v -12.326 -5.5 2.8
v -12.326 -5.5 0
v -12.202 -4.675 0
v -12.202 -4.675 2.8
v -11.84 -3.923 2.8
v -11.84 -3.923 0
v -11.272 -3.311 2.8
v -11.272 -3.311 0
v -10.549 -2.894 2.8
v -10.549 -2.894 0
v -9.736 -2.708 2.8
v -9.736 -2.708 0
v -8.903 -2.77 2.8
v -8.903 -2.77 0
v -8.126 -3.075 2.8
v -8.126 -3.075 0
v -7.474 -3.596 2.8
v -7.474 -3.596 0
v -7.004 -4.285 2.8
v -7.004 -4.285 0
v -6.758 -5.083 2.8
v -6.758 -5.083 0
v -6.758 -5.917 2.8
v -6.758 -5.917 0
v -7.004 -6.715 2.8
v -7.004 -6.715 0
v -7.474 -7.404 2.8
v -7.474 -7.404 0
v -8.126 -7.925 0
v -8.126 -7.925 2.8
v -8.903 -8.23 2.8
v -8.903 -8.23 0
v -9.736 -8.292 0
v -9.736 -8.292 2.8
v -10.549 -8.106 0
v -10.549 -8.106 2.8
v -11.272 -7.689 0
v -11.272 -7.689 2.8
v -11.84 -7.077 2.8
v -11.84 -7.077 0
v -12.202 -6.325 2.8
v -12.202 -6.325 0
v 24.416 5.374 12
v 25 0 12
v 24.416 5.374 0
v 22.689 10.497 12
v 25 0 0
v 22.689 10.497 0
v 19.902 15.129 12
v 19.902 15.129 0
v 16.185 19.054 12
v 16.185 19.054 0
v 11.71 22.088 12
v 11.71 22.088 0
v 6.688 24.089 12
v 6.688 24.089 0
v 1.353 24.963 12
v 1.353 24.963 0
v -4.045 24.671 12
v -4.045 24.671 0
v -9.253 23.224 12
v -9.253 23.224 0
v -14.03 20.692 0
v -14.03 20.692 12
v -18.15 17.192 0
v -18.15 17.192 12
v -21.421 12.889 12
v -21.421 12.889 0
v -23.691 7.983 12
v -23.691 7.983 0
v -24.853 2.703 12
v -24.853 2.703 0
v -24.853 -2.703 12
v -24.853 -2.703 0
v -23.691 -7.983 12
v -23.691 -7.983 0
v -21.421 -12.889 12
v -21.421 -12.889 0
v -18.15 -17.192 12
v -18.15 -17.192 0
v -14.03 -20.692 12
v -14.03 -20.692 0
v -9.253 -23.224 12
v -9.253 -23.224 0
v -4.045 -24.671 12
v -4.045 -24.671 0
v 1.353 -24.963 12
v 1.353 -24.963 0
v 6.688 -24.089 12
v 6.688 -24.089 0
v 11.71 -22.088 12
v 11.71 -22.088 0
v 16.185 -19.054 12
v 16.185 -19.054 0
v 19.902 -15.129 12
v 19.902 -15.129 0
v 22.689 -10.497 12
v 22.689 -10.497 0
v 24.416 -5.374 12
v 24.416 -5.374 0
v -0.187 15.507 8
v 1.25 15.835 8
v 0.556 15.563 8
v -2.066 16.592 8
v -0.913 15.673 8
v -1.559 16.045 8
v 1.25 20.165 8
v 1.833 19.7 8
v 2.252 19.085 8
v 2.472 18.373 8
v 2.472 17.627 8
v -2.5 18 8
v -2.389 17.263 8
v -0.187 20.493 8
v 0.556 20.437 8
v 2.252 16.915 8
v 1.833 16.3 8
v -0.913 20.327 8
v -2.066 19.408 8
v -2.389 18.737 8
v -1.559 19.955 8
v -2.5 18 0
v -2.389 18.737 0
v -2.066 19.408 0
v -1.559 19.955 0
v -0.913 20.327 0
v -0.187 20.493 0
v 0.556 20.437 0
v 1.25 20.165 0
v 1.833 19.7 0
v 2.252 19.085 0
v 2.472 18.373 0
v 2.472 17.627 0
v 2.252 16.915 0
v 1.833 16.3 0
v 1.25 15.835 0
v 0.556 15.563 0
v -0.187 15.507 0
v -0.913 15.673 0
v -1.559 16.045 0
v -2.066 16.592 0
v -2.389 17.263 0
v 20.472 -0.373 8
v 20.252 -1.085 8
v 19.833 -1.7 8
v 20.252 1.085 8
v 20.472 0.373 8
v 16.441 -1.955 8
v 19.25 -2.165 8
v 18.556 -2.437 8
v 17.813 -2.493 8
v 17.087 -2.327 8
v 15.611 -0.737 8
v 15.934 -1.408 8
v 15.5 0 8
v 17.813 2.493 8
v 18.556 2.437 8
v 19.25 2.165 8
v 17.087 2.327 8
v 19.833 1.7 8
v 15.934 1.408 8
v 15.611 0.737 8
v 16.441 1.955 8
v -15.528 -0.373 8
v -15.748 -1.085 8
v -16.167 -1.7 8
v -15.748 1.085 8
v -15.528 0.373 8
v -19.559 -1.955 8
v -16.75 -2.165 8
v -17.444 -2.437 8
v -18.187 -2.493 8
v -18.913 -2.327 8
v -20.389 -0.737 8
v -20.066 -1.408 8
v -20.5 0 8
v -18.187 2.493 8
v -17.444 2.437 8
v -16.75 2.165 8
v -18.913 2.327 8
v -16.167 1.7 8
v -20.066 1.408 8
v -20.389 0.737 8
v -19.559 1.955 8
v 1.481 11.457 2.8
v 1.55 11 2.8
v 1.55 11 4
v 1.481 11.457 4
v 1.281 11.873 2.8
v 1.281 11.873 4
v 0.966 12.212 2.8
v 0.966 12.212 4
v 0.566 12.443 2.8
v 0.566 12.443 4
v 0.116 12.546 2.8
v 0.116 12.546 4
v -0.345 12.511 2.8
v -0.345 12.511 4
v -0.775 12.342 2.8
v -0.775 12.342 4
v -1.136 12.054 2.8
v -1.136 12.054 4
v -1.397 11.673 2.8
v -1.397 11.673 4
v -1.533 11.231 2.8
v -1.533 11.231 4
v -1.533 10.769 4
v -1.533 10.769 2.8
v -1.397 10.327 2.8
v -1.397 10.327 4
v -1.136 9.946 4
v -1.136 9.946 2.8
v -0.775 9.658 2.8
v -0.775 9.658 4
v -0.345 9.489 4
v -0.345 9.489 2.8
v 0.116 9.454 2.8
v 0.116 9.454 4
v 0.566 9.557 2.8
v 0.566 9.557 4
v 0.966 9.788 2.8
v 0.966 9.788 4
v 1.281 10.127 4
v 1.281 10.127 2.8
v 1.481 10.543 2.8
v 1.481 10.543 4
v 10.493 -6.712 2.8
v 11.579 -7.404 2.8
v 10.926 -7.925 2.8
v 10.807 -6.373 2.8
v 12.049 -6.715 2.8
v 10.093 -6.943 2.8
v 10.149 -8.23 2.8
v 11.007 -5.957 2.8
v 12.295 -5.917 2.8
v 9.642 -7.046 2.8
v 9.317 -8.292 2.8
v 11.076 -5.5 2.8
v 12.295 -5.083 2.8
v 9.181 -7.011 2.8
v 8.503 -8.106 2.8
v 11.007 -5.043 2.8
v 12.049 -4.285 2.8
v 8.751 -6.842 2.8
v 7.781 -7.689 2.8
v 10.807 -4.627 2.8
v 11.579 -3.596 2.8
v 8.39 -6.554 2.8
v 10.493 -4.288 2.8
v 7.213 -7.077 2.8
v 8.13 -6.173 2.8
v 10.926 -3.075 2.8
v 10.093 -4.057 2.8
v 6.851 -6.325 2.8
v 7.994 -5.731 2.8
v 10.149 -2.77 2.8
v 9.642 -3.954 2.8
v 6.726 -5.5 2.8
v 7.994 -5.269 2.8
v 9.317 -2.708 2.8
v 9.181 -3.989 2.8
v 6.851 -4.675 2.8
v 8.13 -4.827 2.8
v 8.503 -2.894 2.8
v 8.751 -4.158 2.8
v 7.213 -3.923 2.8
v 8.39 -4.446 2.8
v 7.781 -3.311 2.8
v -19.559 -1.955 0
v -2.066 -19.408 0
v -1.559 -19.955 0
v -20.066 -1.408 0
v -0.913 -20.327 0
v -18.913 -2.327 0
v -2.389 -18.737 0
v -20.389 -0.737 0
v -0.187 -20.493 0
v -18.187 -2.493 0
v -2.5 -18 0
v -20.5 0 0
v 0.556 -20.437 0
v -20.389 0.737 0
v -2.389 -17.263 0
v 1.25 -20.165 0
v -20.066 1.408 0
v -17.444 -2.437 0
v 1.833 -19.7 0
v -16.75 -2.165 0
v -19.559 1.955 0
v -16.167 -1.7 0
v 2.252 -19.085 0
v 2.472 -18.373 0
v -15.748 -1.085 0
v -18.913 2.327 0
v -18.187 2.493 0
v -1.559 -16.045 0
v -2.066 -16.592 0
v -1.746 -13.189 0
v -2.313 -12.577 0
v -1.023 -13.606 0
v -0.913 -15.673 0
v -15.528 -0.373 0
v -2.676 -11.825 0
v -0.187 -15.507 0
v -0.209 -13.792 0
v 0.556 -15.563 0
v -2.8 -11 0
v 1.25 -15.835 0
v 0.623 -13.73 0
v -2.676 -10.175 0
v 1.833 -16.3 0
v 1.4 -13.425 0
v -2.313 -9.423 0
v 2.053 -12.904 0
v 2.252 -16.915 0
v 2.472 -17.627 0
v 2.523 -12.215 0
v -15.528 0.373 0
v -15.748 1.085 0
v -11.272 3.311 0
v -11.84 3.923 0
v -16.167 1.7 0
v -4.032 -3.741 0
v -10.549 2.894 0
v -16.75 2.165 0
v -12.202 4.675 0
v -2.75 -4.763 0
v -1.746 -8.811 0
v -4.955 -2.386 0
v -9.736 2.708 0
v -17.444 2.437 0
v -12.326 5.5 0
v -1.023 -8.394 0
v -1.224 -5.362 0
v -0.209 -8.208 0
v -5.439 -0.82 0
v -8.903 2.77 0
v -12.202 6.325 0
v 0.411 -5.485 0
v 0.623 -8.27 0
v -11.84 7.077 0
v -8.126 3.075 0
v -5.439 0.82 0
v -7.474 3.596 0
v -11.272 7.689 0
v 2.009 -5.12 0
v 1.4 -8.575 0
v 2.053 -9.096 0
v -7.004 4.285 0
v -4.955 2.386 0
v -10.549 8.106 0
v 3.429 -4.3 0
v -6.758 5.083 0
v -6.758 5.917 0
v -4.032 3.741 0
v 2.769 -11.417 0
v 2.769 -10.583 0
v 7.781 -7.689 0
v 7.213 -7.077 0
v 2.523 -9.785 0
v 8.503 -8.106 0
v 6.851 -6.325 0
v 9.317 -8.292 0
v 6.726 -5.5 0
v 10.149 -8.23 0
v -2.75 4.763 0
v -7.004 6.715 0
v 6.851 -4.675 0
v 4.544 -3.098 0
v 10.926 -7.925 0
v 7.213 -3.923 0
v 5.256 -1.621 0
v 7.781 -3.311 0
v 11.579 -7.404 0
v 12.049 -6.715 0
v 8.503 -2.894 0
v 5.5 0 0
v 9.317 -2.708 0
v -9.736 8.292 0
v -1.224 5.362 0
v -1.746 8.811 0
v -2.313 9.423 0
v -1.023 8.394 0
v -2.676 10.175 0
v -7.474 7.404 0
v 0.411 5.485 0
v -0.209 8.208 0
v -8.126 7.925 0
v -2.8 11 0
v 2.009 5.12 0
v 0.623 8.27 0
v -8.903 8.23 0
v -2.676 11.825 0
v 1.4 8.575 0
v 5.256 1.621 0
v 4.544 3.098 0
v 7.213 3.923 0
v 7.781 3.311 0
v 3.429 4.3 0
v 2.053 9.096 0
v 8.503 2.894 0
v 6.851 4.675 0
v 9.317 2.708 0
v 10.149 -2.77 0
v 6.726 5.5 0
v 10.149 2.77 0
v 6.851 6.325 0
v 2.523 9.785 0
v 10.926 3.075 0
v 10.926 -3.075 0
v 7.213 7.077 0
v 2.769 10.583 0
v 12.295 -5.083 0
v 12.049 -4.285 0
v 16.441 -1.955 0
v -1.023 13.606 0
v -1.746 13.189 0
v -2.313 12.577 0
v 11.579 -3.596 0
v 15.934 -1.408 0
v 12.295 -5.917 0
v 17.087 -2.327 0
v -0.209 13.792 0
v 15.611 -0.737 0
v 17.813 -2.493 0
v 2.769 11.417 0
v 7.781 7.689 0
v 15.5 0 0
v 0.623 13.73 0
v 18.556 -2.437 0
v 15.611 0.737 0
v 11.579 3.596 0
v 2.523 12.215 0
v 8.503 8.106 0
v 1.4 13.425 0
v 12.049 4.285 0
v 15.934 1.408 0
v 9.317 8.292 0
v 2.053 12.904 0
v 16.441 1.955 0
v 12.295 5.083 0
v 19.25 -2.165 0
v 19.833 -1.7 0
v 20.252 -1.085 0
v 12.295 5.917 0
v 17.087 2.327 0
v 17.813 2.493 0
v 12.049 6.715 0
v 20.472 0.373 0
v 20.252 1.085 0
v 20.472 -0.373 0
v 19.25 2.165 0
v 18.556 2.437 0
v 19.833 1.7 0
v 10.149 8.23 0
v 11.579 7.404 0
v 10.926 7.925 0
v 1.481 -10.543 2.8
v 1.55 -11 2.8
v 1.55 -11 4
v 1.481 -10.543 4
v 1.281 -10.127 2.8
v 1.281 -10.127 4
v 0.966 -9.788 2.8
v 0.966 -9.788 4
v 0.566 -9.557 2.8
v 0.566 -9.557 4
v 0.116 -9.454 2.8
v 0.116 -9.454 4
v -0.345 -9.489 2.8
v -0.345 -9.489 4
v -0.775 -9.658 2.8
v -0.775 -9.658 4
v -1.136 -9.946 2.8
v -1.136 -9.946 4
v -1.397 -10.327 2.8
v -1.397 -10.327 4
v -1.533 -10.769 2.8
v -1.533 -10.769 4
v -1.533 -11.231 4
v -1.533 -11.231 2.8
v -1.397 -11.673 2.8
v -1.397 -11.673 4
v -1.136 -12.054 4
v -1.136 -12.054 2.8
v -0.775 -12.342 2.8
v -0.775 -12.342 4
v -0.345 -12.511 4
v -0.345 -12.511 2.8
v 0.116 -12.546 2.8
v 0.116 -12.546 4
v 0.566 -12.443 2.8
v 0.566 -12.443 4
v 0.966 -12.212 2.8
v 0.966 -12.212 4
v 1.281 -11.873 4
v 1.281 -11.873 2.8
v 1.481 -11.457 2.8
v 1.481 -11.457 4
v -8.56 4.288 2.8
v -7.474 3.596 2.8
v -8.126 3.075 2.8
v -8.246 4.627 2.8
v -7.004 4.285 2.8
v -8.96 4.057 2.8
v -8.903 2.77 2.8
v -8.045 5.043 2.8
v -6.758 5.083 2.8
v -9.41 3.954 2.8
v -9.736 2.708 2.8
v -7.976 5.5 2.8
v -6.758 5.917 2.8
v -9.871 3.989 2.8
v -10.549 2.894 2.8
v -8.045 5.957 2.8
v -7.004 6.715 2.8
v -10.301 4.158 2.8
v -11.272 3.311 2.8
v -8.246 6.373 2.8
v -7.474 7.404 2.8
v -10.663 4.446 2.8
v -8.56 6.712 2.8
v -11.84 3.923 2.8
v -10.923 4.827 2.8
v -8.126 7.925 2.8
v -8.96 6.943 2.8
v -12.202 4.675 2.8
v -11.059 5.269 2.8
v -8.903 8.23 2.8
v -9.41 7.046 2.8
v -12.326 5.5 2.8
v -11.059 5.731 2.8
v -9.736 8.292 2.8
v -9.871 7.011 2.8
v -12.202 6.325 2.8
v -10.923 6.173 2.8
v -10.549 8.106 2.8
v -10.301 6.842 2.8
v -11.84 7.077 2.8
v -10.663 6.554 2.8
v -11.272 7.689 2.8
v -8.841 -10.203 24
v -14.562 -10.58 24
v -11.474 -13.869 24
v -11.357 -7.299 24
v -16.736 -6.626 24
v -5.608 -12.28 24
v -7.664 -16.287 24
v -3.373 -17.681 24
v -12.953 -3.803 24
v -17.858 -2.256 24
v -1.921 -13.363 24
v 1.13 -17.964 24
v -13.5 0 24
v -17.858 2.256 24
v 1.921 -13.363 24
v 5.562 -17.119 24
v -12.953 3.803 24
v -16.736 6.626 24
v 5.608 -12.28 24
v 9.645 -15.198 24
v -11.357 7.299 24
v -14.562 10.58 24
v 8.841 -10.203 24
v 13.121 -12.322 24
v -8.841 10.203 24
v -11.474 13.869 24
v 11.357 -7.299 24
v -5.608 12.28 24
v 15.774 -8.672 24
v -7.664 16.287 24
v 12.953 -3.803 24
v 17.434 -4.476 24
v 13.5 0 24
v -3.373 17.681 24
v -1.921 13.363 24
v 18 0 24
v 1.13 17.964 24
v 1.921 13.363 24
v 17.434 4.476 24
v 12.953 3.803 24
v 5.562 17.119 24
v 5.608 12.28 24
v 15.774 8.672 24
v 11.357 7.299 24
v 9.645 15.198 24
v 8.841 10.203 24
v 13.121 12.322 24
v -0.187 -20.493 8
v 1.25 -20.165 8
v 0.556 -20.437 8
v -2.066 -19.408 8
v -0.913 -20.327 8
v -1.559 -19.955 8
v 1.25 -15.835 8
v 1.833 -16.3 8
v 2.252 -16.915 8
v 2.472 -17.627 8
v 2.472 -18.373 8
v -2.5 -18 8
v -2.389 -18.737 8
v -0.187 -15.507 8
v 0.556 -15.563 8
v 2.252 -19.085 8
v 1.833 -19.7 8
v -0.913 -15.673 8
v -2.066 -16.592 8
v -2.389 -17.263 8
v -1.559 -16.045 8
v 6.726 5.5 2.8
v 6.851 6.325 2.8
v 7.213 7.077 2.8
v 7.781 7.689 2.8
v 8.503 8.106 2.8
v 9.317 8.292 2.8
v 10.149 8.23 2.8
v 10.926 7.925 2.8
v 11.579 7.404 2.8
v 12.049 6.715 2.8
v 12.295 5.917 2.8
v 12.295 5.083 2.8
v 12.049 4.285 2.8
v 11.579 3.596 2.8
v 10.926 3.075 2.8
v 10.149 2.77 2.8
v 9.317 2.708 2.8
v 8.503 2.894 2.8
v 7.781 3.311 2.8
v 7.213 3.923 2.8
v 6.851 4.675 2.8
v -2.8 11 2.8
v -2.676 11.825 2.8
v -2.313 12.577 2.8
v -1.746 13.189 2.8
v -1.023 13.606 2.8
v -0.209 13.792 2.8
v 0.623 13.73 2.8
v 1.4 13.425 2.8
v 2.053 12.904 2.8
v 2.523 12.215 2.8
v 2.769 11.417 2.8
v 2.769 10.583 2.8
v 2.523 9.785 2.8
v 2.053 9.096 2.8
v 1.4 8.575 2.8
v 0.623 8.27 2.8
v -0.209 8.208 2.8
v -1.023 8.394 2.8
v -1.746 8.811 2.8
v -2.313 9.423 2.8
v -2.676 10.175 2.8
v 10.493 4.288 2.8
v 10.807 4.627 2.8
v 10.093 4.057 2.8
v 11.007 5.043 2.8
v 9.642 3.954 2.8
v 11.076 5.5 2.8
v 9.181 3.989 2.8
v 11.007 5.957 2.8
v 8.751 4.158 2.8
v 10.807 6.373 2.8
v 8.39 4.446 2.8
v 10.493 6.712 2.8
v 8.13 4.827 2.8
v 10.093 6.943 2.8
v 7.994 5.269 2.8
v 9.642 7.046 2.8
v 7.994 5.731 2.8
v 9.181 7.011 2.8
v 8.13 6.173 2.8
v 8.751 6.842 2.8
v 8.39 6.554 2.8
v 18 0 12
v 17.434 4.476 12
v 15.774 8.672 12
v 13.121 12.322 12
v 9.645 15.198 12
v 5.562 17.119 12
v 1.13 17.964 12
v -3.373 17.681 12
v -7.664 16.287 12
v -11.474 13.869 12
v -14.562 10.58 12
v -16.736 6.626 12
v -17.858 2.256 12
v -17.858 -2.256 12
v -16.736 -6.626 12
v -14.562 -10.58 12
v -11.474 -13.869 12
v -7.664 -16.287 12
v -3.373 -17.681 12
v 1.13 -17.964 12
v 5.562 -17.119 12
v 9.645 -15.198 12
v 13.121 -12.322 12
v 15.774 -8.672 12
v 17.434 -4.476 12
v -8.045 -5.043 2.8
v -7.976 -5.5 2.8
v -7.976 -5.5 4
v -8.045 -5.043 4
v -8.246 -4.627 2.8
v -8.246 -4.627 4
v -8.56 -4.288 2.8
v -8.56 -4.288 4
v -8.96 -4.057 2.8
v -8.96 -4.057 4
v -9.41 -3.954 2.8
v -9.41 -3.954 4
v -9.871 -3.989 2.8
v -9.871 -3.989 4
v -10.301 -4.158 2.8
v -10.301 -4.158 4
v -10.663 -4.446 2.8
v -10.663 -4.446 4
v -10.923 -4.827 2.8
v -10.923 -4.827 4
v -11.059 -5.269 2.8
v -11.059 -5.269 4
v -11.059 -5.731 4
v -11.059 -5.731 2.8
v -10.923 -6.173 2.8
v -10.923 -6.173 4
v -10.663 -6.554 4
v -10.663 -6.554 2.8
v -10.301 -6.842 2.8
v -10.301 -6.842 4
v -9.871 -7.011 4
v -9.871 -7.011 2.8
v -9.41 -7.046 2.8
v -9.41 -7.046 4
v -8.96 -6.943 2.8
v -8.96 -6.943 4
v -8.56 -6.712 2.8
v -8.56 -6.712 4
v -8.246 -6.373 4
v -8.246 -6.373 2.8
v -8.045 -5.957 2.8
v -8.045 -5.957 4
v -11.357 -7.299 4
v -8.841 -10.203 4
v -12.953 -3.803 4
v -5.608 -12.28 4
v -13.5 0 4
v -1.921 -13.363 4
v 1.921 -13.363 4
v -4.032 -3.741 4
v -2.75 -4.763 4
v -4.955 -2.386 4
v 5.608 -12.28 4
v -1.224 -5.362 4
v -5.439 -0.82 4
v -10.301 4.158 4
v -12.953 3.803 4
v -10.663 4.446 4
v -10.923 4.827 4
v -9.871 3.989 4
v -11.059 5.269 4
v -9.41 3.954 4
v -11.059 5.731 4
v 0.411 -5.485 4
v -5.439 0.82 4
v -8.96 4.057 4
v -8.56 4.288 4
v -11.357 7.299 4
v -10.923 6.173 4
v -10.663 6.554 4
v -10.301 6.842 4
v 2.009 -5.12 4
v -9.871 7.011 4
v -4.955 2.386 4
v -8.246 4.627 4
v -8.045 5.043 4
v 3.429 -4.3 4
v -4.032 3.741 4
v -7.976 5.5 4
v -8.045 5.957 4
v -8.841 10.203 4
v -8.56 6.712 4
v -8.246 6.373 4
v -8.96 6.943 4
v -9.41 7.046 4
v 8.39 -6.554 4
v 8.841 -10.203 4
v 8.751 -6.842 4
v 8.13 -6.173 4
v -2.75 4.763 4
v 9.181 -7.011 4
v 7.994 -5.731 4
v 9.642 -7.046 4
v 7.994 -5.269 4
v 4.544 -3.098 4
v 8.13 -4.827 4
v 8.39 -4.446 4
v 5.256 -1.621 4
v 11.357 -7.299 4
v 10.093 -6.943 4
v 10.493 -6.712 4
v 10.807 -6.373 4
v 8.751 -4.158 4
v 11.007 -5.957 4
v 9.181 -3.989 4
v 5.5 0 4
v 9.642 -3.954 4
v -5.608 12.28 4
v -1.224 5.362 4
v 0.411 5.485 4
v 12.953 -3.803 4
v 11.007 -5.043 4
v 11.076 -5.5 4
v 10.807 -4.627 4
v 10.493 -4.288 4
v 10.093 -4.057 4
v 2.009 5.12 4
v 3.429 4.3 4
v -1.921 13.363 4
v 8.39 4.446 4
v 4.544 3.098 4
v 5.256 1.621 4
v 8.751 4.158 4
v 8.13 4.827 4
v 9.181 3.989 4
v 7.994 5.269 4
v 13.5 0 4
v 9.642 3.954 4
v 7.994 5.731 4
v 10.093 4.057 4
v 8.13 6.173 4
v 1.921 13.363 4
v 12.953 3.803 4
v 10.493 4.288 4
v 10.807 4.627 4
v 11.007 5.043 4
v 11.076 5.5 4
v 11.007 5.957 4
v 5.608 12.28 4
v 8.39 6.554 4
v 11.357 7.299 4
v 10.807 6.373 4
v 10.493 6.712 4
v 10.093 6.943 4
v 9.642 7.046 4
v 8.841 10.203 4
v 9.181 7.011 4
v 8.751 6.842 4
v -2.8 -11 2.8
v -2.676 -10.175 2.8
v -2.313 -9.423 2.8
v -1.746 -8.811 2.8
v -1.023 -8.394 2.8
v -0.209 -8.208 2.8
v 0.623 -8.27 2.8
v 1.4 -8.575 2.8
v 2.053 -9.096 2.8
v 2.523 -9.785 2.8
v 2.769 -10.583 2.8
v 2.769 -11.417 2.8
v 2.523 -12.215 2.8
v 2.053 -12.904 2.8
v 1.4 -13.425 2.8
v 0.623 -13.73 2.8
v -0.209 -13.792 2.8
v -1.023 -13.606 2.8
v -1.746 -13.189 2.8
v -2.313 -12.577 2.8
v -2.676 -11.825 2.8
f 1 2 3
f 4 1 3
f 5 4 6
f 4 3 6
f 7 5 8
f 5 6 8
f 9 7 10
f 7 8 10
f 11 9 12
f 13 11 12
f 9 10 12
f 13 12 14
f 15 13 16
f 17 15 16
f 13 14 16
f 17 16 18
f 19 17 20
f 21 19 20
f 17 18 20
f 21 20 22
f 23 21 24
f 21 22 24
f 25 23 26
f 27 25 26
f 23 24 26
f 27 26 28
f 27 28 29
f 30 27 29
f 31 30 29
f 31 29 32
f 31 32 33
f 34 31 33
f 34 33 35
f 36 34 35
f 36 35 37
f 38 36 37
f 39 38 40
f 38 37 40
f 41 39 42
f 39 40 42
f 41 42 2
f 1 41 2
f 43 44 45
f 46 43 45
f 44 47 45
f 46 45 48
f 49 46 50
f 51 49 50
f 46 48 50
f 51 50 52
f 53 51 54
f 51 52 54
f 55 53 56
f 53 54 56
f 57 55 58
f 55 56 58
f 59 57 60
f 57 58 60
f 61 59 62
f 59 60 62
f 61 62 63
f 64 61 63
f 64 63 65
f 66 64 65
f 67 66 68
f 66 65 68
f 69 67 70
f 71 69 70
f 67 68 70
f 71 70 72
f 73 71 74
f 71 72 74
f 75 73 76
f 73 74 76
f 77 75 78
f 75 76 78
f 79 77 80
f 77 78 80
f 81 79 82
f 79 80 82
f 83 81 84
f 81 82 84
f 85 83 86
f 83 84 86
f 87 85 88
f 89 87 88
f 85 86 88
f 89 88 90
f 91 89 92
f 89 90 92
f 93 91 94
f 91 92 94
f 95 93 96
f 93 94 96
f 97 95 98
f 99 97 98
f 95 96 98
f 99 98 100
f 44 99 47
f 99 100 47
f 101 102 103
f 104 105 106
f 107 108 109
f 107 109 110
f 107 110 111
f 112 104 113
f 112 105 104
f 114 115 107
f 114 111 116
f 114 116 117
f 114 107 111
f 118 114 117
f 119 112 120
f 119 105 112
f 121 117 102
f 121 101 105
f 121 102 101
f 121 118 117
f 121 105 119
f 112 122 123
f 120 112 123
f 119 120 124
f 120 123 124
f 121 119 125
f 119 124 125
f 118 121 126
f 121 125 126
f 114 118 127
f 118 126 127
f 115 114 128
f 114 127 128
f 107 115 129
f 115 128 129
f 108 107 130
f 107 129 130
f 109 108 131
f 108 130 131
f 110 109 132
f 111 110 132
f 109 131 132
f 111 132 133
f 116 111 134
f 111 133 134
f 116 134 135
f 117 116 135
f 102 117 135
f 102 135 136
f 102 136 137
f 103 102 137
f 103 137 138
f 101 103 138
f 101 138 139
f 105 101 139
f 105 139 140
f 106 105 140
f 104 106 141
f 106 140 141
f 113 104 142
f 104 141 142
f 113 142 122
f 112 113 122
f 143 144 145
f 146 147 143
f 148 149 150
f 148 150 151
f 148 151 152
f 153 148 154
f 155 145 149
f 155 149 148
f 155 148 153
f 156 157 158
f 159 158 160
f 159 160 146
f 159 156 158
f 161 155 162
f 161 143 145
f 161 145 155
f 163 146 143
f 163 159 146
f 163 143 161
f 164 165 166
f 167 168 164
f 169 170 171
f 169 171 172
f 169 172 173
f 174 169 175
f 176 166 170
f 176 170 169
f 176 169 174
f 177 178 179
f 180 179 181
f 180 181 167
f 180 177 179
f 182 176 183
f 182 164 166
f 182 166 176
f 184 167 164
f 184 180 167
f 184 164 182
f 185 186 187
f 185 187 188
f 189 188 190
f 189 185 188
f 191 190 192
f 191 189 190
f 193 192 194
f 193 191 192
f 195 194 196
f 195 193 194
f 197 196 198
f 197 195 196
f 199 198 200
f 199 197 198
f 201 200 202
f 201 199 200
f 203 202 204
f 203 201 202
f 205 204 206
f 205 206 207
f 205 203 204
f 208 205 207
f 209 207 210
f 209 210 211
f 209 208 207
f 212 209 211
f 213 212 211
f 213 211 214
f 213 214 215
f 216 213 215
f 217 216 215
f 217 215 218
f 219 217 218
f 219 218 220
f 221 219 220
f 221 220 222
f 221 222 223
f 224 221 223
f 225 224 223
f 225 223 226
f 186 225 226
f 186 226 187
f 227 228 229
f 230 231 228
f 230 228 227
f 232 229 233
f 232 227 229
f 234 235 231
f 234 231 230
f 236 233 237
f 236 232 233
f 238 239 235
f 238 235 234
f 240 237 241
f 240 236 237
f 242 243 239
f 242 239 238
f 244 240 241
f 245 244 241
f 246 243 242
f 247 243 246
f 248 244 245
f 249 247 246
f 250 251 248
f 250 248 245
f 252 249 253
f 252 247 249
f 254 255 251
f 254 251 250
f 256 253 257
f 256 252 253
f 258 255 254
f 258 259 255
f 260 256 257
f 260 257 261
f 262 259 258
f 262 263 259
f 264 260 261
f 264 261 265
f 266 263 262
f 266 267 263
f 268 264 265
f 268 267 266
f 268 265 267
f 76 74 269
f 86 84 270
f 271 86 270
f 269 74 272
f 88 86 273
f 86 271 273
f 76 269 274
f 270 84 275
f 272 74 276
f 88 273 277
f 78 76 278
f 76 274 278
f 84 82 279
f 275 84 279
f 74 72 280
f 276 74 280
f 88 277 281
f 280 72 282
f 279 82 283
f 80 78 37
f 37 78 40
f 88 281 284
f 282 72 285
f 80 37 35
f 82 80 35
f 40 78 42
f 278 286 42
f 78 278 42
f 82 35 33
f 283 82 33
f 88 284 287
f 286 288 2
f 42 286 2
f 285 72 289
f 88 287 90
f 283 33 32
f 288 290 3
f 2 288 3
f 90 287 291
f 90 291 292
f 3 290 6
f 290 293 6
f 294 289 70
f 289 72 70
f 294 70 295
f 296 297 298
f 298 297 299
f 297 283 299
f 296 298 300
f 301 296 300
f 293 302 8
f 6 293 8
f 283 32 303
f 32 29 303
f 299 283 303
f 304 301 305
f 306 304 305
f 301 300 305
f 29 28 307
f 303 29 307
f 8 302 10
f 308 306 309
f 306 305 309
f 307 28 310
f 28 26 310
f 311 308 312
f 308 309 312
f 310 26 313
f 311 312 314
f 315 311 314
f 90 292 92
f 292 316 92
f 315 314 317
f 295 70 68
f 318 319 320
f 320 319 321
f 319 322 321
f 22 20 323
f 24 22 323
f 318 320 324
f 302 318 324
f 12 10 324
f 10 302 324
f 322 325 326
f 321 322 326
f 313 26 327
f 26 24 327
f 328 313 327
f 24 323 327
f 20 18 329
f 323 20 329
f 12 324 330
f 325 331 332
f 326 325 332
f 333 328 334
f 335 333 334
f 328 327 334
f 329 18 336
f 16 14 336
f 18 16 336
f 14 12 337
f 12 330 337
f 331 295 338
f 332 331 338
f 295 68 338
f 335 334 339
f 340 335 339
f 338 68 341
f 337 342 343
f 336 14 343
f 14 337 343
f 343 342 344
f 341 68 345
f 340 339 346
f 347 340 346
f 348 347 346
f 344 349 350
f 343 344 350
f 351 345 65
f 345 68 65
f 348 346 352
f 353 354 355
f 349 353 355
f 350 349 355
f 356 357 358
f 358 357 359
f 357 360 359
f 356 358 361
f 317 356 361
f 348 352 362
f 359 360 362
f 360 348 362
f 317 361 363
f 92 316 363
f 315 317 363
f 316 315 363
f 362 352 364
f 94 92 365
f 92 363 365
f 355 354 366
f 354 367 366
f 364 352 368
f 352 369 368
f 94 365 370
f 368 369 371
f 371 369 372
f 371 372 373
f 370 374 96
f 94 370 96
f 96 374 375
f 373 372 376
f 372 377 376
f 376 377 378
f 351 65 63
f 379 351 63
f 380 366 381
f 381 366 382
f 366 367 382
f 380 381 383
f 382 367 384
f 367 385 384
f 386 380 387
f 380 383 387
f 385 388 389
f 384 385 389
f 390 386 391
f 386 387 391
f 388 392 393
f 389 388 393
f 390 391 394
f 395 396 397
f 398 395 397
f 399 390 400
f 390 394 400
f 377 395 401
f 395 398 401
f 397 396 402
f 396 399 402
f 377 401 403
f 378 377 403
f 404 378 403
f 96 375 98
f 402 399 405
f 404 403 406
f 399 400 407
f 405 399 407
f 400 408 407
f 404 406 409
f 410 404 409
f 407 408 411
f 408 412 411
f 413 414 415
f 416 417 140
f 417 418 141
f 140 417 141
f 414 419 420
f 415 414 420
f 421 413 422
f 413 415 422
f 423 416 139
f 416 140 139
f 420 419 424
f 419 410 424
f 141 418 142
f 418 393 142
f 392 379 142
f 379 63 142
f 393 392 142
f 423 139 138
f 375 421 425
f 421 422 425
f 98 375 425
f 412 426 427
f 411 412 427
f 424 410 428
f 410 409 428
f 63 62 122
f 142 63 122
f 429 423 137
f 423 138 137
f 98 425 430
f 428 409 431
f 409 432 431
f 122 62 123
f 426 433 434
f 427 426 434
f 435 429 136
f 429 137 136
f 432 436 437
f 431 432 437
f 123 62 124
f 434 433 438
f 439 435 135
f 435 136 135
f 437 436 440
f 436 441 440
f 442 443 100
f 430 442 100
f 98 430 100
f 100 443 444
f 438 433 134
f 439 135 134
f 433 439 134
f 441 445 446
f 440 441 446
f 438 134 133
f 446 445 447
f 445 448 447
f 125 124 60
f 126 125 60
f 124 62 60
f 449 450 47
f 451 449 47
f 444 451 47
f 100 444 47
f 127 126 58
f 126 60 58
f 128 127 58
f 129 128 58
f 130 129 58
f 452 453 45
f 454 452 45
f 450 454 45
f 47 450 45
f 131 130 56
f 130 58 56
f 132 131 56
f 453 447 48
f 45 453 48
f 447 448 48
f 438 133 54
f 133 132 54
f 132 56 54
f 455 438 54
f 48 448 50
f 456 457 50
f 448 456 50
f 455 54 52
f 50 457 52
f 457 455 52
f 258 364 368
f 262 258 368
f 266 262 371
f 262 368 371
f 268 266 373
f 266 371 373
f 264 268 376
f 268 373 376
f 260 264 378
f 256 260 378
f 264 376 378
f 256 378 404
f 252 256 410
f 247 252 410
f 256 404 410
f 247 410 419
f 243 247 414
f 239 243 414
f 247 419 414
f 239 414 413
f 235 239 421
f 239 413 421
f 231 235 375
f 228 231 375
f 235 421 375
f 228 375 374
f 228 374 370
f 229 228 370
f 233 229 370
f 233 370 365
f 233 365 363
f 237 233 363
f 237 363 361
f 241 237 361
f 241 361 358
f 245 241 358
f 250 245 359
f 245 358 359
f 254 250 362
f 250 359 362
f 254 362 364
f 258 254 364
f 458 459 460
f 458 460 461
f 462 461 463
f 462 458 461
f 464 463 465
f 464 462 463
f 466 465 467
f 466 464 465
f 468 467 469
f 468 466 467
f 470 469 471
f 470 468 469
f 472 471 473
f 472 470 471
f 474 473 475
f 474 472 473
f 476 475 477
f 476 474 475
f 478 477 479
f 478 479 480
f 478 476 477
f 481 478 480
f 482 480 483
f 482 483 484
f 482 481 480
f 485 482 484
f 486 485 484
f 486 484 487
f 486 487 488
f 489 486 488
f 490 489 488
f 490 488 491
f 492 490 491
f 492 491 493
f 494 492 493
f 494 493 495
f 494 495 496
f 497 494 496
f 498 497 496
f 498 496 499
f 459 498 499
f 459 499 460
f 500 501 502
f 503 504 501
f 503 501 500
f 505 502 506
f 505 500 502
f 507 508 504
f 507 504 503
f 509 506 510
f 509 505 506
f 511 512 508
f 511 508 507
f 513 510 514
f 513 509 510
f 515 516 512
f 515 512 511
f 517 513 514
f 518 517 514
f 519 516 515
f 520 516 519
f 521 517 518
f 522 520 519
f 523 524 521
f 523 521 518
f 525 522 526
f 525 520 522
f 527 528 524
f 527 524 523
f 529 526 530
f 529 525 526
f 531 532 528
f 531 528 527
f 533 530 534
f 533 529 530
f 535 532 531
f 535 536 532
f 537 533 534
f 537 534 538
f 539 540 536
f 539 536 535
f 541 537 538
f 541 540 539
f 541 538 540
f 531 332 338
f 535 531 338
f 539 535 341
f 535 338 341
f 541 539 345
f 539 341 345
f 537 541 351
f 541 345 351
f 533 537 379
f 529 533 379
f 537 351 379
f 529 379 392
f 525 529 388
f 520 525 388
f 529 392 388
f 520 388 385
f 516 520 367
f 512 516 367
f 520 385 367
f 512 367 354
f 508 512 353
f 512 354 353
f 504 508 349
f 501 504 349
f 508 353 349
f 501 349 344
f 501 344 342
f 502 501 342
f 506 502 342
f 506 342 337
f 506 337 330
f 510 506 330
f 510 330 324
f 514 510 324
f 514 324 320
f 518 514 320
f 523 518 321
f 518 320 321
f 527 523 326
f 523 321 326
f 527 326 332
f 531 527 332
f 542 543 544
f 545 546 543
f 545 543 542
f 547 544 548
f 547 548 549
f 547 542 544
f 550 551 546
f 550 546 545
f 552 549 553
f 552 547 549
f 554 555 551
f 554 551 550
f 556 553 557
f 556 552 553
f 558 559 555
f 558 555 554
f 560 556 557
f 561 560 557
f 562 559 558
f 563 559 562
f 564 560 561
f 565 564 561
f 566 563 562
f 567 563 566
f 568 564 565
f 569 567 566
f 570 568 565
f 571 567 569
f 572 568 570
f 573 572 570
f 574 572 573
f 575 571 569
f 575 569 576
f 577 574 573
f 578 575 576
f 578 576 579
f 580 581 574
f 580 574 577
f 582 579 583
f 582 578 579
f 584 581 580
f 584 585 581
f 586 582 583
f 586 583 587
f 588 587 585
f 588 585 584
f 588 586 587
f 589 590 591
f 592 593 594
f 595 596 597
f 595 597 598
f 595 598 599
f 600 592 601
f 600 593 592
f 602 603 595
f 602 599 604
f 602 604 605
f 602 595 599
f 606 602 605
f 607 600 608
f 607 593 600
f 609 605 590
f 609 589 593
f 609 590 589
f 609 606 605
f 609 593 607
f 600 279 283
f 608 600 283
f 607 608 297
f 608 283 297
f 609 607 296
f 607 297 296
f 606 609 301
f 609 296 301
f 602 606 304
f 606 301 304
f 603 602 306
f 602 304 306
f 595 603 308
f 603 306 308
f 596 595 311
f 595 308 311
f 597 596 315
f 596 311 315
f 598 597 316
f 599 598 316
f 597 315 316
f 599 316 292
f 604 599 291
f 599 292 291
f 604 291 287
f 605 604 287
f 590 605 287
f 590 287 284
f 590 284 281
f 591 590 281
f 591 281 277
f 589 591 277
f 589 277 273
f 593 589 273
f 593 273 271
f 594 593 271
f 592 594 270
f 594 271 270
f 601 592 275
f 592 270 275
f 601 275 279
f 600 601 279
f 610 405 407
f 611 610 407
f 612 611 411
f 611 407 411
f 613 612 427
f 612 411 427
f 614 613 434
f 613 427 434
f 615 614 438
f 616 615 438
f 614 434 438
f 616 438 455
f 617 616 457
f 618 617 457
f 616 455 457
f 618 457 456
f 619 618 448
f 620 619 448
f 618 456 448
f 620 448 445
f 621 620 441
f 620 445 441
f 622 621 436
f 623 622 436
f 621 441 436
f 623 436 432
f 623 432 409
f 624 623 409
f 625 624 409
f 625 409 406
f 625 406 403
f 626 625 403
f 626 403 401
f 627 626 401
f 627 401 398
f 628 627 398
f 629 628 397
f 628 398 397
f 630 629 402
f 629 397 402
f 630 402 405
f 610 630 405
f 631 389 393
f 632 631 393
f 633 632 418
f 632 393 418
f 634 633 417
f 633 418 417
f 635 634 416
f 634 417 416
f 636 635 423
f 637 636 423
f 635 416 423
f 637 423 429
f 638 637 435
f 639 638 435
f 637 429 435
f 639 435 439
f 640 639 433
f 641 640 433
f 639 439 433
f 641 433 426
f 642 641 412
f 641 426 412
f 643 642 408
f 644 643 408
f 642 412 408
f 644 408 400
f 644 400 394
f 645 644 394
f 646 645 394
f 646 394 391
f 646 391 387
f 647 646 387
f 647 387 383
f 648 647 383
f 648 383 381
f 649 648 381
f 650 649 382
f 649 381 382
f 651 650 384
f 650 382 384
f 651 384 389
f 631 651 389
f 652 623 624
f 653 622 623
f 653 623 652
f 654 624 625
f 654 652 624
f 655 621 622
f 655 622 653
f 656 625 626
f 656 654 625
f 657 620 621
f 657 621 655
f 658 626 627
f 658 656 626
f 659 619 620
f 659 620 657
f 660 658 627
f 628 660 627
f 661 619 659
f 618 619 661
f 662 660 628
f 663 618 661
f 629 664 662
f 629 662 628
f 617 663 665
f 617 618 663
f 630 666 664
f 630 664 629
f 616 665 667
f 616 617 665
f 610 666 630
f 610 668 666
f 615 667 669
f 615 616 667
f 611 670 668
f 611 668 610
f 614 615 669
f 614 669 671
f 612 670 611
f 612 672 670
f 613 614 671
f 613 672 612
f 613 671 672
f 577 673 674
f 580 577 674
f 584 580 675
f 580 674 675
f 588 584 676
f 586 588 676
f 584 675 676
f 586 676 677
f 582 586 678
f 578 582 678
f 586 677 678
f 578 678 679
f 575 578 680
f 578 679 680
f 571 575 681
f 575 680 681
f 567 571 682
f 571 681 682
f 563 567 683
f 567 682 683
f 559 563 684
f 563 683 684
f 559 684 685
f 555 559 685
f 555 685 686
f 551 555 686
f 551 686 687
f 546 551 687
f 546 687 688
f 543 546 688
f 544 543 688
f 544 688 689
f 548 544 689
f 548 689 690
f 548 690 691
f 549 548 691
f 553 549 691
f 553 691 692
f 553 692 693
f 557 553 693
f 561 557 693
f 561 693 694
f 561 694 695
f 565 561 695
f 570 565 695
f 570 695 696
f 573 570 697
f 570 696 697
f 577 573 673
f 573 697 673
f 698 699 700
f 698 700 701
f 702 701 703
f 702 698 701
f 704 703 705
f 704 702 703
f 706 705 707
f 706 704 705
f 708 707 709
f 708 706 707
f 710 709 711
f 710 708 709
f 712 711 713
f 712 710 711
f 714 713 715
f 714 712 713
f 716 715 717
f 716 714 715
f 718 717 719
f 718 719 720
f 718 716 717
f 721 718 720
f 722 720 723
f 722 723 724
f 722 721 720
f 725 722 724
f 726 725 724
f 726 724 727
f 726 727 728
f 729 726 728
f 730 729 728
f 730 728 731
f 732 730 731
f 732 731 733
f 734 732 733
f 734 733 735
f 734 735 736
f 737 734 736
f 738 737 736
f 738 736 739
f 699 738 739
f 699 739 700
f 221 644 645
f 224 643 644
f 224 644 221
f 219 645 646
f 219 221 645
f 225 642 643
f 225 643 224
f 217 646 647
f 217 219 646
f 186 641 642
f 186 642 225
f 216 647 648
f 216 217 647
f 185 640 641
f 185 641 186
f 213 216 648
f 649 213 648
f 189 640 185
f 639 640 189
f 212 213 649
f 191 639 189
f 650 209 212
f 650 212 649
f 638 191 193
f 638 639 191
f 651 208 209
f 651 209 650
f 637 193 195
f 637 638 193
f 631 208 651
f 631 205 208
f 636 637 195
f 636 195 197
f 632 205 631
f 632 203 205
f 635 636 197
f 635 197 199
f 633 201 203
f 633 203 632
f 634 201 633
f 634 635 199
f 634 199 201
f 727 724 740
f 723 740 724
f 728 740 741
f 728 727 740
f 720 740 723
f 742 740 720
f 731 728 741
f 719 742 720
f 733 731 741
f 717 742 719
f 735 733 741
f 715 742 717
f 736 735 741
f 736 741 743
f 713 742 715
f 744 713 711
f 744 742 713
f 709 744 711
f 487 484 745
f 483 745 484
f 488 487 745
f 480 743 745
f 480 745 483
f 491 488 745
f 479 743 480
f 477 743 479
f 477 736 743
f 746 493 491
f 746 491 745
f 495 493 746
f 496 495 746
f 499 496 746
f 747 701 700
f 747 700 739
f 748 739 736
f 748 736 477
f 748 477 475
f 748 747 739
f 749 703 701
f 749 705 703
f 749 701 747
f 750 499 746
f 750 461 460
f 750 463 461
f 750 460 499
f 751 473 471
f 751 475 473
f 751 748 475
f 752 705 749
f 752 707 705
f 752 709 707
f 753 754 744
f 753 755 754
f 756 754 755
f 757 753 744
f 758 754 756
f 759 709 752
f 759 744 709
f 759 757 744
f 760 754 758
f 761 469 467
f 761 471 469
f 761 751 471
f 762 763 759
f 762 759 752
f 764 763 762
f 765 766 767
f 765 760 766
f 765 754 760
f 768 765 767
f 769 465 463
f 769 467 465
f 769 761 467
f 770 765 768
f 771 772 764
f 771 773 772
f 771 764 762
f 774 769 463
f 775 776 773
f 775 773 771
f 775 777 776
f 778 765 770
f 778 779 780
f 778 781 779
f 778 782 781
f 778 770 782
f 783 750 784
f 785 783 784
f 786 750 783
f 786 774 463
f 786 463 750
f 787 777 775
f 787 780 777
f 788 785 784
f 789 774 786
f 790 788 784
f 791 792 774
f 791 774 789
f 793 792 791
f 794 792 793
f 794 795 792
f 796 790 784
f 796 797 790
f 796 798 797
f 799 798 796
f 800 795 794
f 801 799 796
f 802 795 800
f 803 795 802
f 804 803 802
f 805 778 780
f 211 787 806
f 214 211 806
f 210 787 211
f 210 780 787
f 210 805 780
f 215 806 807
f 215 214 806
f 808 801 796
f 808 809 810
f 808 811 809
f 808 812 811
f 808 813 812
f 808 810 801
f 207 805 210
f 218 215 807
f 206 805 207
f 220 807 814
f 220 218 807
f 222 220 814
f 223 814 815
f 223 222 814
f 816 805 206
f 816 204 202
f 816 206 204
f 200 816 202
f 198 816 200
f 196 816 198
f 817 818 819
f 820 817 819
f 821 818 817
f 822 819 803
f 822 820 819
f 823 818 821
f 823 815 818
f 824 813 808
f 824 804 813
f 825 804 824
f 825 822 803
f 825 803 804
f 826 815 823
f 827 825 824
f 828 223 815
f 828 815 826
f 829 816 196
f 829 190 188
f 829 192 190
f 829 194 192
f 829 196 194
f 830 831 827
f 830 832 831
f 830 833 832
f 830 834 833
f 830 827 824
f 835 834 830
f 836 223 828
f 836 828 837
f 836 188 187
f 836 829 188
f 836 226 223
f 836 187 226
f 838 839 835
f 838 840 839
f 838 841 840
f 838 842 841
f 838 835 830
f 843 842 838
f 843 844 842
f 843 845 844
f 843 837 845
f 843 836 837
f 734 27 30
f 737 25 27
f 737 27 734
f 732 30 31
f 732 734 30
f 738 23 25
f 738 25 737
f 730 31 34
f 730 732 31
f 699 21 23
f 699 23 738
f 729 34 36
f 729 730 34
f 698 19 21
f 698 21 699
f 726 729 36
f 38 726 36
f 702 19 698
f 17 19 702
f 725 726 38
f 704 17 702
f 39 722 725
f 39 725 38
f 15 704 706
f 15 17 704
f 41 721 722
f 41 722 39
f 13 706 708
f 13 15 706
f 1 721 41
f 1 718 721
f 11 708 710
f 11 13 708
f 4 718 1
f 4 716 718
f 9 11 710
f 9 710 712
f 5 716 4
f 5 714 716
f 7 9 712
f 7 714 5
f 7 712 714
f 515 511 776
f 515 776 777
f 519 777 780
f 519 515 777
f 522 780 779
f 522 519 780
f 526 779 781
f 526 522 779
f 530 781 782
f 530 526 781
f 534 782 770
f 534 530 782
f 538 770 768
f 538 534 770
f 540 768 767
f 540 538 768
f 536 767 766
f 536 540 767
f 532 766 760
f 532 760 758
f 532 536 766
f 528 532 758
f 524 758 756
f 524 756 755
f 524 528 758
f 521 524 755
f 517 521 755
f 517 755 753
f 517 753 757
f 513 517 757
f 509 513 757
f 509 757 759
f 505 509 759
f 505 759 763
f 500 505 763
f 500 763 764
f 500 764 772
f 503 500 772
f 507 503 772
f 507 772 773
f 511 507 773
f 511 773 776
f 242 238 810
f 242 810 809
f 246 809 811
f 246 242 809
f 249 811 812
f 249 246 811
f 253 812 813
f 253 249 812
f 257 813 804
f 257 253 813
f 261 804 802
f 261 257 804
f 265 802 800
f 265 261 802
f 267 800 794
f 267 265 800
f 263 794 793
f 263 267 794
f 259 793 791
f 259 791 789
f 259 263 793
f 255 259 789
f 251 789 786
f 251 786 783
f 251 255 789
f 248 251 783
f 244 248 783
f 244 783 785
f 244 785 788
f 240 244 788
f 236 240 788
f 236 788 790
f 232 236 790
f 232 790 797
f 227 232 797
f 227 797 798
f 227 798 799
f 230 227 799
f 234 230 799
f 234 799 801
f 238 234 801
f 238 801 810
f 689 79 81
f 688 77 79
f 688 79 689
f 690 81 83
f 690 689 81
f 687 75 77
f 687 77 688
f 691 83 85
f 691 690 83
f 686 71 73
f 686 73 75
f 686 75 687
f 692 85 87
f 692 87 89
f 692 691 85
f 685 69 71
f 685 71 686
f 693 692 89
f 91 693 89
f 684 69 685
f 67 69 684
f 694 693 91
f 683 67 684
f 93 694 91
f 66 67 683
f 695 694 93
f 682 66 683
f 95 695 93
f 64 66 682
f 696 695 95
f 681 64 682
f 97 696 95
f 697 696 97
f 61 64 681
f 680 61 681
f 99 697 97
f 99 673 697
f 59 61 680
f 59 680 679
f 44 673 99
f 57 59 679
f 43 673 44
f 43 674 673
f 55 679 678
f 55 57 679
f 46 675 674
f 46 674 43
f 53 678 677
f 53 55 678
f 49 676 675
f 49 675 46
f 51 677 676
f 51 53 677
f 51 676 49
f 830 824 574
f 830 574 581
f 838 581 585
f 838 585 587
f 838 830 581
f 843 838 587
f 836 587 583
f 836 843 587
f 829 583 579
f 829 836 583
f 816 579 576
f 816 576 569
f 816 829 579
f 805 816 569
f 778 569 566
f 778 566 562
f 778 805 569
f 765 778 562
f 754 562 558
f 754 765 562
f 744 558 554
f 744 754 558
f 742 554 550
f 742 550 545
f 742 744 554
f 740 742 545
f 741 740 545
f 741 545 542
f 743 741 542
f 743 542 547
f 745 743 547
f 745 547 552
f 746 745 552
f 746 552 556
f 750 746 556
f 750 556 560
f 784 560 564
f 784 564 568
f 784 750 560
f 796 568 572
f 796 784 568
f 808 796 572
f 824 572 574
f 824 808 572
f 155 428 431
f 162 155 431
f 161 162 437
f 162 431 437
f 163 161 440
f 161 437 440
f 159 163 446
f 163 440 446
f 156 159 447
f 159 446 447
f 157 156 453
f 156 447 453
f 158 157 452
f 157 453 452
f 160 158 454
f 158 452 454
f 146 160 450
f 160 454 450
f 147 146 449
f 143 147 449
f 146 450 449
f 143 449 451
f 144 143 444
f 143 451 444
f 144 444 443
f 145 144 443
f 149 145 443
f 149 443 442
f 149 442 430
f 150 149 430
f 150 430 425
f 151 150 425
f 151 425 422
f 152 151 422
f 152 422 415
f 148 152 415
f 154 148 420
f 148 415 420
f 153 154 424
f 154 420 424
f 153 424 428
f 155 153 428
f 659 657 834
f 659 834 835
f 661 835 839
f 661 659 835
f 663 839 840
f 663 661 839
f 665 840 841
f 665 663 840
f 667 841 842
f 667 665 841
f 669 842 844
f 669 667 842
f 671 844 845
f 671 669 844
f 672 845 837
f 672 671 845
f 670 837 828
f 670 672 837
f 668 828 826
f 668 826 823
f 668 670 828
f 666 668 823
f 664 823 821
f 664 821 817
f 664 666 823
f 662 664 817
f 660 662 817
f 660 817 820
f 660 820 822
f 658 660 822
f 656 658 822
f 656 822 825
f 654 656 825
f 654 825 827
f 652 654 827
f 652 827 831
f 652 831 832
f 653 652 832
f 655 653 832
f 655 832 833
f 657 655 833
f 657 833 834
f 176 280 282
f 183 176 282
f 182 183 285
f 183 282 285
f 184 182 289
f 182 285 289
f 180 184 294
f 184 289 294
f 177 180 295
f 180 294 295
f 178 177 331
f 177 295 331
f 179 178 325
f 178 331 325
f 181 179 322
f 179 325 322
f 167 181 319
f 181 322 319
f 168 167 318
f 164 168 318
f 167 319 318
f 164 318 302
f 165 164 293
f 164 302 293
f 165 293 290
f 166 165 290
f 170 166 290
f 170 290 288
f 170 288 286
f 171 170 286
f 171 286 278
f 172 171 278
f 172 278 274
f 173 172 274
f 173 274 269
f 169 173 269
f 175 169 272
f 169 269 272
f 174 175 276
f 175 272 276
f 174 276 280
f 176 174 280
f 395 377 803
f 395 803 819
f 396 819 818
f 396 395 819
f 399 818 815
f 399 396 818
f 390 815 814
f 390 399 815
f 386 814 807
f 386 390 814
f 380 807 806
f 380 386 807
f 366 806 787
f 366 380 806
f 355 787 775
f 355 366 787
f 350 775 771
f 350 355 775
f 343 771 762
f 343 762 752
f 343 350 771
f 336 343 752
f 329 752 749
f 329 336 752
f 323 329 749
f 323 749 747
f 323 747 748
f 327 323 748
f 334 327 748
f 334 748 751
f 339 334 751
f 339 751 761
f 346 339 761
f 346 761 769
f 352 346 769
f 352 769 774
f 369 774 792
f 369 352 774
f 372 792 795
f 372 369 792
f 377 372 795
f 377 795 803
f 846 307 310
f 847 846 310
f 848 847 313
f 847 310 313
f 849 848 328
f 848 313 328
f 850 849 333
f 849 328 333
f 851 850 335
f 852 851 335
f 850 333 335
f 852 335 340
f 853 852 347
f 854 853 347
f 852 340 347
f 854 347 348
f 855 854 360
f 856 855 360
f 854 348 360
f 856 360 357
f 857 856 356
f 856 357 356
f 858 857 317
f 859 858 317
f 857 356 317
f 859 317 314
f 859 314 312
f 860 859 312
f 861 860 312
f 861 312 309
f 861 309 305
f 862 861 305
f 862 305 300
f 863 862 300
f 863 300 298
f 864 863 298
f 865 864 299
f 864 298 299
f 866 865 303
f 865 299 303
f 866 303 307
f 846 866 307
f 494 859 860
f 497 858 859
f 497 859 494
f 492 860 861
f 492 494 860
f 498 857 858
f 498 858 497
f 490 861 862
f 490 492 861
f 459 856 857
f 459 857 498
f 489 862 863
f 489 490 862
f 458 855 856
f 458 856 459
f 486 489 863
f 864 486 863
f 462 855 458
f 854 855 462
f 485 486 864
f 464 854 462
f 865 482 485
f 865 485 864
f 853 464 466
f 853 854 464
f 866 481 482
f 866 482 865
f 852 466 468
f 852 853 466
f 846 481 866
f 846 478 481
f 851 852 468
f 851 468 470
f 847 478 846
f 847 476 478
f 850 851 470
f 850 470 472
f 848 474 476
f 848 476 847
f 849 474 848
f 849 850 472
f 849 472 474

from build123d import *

# Parameters (mm, degrees)
SKETCH1_R           = 25
SKETCH1_R_2         = 5.5
SKETCH1_R_3         = 1.55
BOSS_EXTRUDE1_DEPTH = 4
SKETCH2_R           = 2.8
CUT_EXTRUDE1_DEPTH  = 2.8
SKETCH4_R           = 18
SKETCH4_R_2         = 13.5
BOSS_EXTRUDE2_DEPTH = 20
SKETCH5_R           = 25
SKETCH5_R_2         = 18
BOSS_EXTRUDE3_DEPTH = 8
SKETCH3_R           = 2.5
CUT_EXTRUDE3_DEPTH  = 8


with BuildPart() as part:
    # Sketch1 → Boss-Extrude1 (new body)
    with BuildSketch(Plane.XY):
        Circle(SKETCH1_R)
        Circle(SKETCH1_R_2, mode=Mode.SUBTRACT)
        with Locations((0, 11)):
            Circle(SKETCH1_R_3, mode=Mode.SUBTRACT)
        with Locations((9.526279442, 5.5)):
            Circle(SKETCH1_R_3, mode=Mode.SUBTRACT)
        with Locations((9.526279442, -5.5)):
            Circle(SKETCH1_R_3, mode=Mode.SUBTRACT)
        with Locations((0, -11)):
            Circle(SKETCH1_R_3, mode=Mode.SUBTRACT)
        with Locations((-9.526279442, -5.5)):
            Circle(SKETCH1_R_3, mode=Mode.SUBTRACT)
        with Locations((-9.526279442, 5.5)):
            Circle(SKETCH1_R_3, mode=Mode.SUBTRACT)
    extrude(amount=BOSS_EXTRUDE1_DEPTH)

    # Sketch2 → Cut-Extrude1 (cut)
    with BuildSketch(Plane(origin=(0, 0, 0), x_dir=(-1, 0, 0), z_dir=(0, 0, -1))):
        with Locations((0, 11)):
            Circle(SKETCH2_R)
        with Locations((9.526279442, 5.5)):
            Circle(SKETCH2_R)
        with Locations((9.526279442, -5.5)):
            Circle(SKETCH2_R)
        with Locations((0, -11)):
            Circle(SKETCH2_R)
        with Locations((-9.526279442, -5.5)):
            Circle(SKETCH2_R)
        with Locations((-9.526279442, 5.5)):
            Circle(SKETCH2_R)
    extrude(amount=-CUT_EXTRUDE1_DEPTH, mode=Mode.SUBTRACT)

    # Sketch4 → Boss-Extrude2 (add)
    with BuildSketch(Plane.XY.offset(4)):
        Circle(SKETCH4_R)
        Circle(SKETCH4_R_2, mode=Mode.SUBTRACT)
    extrude(amount=BOSS_EXTRUDE2_DEPTH)

    # Sketch5 → Boss-Extrude3 (add)
    with BuildSketch(Plane.XY.offset(4)):
        Circle(SKETCH5_R)
        Circle(SKETCH5_R_2, mode=Mode.SUBTRACT)
    extrude(amount=BOSS_EXTRUDE3_DEPTH)

    # Sketch3 → Cut-Extrude3 (cut)
    with BuildSketch(Plane(origin=(0, 0, 0), x_dir=(-1, 0, 0), z_dir=(0, 0, -1))):
        with Locations((0, 18)):
            Circle(SKETCH3_R)
        with Locations((18, 0)):
            Circle(SKETCH3_R)
        with Locations((0, -18)):
            Circle(SKETCH3_R)
        with Locations((-18, 0)):
            Circle(SKETCH3_R)
    extrude(amount=-CUT_EXTRUDE3_DEPTH, mode=Mode.SUBTRACT)


solid = part.part
